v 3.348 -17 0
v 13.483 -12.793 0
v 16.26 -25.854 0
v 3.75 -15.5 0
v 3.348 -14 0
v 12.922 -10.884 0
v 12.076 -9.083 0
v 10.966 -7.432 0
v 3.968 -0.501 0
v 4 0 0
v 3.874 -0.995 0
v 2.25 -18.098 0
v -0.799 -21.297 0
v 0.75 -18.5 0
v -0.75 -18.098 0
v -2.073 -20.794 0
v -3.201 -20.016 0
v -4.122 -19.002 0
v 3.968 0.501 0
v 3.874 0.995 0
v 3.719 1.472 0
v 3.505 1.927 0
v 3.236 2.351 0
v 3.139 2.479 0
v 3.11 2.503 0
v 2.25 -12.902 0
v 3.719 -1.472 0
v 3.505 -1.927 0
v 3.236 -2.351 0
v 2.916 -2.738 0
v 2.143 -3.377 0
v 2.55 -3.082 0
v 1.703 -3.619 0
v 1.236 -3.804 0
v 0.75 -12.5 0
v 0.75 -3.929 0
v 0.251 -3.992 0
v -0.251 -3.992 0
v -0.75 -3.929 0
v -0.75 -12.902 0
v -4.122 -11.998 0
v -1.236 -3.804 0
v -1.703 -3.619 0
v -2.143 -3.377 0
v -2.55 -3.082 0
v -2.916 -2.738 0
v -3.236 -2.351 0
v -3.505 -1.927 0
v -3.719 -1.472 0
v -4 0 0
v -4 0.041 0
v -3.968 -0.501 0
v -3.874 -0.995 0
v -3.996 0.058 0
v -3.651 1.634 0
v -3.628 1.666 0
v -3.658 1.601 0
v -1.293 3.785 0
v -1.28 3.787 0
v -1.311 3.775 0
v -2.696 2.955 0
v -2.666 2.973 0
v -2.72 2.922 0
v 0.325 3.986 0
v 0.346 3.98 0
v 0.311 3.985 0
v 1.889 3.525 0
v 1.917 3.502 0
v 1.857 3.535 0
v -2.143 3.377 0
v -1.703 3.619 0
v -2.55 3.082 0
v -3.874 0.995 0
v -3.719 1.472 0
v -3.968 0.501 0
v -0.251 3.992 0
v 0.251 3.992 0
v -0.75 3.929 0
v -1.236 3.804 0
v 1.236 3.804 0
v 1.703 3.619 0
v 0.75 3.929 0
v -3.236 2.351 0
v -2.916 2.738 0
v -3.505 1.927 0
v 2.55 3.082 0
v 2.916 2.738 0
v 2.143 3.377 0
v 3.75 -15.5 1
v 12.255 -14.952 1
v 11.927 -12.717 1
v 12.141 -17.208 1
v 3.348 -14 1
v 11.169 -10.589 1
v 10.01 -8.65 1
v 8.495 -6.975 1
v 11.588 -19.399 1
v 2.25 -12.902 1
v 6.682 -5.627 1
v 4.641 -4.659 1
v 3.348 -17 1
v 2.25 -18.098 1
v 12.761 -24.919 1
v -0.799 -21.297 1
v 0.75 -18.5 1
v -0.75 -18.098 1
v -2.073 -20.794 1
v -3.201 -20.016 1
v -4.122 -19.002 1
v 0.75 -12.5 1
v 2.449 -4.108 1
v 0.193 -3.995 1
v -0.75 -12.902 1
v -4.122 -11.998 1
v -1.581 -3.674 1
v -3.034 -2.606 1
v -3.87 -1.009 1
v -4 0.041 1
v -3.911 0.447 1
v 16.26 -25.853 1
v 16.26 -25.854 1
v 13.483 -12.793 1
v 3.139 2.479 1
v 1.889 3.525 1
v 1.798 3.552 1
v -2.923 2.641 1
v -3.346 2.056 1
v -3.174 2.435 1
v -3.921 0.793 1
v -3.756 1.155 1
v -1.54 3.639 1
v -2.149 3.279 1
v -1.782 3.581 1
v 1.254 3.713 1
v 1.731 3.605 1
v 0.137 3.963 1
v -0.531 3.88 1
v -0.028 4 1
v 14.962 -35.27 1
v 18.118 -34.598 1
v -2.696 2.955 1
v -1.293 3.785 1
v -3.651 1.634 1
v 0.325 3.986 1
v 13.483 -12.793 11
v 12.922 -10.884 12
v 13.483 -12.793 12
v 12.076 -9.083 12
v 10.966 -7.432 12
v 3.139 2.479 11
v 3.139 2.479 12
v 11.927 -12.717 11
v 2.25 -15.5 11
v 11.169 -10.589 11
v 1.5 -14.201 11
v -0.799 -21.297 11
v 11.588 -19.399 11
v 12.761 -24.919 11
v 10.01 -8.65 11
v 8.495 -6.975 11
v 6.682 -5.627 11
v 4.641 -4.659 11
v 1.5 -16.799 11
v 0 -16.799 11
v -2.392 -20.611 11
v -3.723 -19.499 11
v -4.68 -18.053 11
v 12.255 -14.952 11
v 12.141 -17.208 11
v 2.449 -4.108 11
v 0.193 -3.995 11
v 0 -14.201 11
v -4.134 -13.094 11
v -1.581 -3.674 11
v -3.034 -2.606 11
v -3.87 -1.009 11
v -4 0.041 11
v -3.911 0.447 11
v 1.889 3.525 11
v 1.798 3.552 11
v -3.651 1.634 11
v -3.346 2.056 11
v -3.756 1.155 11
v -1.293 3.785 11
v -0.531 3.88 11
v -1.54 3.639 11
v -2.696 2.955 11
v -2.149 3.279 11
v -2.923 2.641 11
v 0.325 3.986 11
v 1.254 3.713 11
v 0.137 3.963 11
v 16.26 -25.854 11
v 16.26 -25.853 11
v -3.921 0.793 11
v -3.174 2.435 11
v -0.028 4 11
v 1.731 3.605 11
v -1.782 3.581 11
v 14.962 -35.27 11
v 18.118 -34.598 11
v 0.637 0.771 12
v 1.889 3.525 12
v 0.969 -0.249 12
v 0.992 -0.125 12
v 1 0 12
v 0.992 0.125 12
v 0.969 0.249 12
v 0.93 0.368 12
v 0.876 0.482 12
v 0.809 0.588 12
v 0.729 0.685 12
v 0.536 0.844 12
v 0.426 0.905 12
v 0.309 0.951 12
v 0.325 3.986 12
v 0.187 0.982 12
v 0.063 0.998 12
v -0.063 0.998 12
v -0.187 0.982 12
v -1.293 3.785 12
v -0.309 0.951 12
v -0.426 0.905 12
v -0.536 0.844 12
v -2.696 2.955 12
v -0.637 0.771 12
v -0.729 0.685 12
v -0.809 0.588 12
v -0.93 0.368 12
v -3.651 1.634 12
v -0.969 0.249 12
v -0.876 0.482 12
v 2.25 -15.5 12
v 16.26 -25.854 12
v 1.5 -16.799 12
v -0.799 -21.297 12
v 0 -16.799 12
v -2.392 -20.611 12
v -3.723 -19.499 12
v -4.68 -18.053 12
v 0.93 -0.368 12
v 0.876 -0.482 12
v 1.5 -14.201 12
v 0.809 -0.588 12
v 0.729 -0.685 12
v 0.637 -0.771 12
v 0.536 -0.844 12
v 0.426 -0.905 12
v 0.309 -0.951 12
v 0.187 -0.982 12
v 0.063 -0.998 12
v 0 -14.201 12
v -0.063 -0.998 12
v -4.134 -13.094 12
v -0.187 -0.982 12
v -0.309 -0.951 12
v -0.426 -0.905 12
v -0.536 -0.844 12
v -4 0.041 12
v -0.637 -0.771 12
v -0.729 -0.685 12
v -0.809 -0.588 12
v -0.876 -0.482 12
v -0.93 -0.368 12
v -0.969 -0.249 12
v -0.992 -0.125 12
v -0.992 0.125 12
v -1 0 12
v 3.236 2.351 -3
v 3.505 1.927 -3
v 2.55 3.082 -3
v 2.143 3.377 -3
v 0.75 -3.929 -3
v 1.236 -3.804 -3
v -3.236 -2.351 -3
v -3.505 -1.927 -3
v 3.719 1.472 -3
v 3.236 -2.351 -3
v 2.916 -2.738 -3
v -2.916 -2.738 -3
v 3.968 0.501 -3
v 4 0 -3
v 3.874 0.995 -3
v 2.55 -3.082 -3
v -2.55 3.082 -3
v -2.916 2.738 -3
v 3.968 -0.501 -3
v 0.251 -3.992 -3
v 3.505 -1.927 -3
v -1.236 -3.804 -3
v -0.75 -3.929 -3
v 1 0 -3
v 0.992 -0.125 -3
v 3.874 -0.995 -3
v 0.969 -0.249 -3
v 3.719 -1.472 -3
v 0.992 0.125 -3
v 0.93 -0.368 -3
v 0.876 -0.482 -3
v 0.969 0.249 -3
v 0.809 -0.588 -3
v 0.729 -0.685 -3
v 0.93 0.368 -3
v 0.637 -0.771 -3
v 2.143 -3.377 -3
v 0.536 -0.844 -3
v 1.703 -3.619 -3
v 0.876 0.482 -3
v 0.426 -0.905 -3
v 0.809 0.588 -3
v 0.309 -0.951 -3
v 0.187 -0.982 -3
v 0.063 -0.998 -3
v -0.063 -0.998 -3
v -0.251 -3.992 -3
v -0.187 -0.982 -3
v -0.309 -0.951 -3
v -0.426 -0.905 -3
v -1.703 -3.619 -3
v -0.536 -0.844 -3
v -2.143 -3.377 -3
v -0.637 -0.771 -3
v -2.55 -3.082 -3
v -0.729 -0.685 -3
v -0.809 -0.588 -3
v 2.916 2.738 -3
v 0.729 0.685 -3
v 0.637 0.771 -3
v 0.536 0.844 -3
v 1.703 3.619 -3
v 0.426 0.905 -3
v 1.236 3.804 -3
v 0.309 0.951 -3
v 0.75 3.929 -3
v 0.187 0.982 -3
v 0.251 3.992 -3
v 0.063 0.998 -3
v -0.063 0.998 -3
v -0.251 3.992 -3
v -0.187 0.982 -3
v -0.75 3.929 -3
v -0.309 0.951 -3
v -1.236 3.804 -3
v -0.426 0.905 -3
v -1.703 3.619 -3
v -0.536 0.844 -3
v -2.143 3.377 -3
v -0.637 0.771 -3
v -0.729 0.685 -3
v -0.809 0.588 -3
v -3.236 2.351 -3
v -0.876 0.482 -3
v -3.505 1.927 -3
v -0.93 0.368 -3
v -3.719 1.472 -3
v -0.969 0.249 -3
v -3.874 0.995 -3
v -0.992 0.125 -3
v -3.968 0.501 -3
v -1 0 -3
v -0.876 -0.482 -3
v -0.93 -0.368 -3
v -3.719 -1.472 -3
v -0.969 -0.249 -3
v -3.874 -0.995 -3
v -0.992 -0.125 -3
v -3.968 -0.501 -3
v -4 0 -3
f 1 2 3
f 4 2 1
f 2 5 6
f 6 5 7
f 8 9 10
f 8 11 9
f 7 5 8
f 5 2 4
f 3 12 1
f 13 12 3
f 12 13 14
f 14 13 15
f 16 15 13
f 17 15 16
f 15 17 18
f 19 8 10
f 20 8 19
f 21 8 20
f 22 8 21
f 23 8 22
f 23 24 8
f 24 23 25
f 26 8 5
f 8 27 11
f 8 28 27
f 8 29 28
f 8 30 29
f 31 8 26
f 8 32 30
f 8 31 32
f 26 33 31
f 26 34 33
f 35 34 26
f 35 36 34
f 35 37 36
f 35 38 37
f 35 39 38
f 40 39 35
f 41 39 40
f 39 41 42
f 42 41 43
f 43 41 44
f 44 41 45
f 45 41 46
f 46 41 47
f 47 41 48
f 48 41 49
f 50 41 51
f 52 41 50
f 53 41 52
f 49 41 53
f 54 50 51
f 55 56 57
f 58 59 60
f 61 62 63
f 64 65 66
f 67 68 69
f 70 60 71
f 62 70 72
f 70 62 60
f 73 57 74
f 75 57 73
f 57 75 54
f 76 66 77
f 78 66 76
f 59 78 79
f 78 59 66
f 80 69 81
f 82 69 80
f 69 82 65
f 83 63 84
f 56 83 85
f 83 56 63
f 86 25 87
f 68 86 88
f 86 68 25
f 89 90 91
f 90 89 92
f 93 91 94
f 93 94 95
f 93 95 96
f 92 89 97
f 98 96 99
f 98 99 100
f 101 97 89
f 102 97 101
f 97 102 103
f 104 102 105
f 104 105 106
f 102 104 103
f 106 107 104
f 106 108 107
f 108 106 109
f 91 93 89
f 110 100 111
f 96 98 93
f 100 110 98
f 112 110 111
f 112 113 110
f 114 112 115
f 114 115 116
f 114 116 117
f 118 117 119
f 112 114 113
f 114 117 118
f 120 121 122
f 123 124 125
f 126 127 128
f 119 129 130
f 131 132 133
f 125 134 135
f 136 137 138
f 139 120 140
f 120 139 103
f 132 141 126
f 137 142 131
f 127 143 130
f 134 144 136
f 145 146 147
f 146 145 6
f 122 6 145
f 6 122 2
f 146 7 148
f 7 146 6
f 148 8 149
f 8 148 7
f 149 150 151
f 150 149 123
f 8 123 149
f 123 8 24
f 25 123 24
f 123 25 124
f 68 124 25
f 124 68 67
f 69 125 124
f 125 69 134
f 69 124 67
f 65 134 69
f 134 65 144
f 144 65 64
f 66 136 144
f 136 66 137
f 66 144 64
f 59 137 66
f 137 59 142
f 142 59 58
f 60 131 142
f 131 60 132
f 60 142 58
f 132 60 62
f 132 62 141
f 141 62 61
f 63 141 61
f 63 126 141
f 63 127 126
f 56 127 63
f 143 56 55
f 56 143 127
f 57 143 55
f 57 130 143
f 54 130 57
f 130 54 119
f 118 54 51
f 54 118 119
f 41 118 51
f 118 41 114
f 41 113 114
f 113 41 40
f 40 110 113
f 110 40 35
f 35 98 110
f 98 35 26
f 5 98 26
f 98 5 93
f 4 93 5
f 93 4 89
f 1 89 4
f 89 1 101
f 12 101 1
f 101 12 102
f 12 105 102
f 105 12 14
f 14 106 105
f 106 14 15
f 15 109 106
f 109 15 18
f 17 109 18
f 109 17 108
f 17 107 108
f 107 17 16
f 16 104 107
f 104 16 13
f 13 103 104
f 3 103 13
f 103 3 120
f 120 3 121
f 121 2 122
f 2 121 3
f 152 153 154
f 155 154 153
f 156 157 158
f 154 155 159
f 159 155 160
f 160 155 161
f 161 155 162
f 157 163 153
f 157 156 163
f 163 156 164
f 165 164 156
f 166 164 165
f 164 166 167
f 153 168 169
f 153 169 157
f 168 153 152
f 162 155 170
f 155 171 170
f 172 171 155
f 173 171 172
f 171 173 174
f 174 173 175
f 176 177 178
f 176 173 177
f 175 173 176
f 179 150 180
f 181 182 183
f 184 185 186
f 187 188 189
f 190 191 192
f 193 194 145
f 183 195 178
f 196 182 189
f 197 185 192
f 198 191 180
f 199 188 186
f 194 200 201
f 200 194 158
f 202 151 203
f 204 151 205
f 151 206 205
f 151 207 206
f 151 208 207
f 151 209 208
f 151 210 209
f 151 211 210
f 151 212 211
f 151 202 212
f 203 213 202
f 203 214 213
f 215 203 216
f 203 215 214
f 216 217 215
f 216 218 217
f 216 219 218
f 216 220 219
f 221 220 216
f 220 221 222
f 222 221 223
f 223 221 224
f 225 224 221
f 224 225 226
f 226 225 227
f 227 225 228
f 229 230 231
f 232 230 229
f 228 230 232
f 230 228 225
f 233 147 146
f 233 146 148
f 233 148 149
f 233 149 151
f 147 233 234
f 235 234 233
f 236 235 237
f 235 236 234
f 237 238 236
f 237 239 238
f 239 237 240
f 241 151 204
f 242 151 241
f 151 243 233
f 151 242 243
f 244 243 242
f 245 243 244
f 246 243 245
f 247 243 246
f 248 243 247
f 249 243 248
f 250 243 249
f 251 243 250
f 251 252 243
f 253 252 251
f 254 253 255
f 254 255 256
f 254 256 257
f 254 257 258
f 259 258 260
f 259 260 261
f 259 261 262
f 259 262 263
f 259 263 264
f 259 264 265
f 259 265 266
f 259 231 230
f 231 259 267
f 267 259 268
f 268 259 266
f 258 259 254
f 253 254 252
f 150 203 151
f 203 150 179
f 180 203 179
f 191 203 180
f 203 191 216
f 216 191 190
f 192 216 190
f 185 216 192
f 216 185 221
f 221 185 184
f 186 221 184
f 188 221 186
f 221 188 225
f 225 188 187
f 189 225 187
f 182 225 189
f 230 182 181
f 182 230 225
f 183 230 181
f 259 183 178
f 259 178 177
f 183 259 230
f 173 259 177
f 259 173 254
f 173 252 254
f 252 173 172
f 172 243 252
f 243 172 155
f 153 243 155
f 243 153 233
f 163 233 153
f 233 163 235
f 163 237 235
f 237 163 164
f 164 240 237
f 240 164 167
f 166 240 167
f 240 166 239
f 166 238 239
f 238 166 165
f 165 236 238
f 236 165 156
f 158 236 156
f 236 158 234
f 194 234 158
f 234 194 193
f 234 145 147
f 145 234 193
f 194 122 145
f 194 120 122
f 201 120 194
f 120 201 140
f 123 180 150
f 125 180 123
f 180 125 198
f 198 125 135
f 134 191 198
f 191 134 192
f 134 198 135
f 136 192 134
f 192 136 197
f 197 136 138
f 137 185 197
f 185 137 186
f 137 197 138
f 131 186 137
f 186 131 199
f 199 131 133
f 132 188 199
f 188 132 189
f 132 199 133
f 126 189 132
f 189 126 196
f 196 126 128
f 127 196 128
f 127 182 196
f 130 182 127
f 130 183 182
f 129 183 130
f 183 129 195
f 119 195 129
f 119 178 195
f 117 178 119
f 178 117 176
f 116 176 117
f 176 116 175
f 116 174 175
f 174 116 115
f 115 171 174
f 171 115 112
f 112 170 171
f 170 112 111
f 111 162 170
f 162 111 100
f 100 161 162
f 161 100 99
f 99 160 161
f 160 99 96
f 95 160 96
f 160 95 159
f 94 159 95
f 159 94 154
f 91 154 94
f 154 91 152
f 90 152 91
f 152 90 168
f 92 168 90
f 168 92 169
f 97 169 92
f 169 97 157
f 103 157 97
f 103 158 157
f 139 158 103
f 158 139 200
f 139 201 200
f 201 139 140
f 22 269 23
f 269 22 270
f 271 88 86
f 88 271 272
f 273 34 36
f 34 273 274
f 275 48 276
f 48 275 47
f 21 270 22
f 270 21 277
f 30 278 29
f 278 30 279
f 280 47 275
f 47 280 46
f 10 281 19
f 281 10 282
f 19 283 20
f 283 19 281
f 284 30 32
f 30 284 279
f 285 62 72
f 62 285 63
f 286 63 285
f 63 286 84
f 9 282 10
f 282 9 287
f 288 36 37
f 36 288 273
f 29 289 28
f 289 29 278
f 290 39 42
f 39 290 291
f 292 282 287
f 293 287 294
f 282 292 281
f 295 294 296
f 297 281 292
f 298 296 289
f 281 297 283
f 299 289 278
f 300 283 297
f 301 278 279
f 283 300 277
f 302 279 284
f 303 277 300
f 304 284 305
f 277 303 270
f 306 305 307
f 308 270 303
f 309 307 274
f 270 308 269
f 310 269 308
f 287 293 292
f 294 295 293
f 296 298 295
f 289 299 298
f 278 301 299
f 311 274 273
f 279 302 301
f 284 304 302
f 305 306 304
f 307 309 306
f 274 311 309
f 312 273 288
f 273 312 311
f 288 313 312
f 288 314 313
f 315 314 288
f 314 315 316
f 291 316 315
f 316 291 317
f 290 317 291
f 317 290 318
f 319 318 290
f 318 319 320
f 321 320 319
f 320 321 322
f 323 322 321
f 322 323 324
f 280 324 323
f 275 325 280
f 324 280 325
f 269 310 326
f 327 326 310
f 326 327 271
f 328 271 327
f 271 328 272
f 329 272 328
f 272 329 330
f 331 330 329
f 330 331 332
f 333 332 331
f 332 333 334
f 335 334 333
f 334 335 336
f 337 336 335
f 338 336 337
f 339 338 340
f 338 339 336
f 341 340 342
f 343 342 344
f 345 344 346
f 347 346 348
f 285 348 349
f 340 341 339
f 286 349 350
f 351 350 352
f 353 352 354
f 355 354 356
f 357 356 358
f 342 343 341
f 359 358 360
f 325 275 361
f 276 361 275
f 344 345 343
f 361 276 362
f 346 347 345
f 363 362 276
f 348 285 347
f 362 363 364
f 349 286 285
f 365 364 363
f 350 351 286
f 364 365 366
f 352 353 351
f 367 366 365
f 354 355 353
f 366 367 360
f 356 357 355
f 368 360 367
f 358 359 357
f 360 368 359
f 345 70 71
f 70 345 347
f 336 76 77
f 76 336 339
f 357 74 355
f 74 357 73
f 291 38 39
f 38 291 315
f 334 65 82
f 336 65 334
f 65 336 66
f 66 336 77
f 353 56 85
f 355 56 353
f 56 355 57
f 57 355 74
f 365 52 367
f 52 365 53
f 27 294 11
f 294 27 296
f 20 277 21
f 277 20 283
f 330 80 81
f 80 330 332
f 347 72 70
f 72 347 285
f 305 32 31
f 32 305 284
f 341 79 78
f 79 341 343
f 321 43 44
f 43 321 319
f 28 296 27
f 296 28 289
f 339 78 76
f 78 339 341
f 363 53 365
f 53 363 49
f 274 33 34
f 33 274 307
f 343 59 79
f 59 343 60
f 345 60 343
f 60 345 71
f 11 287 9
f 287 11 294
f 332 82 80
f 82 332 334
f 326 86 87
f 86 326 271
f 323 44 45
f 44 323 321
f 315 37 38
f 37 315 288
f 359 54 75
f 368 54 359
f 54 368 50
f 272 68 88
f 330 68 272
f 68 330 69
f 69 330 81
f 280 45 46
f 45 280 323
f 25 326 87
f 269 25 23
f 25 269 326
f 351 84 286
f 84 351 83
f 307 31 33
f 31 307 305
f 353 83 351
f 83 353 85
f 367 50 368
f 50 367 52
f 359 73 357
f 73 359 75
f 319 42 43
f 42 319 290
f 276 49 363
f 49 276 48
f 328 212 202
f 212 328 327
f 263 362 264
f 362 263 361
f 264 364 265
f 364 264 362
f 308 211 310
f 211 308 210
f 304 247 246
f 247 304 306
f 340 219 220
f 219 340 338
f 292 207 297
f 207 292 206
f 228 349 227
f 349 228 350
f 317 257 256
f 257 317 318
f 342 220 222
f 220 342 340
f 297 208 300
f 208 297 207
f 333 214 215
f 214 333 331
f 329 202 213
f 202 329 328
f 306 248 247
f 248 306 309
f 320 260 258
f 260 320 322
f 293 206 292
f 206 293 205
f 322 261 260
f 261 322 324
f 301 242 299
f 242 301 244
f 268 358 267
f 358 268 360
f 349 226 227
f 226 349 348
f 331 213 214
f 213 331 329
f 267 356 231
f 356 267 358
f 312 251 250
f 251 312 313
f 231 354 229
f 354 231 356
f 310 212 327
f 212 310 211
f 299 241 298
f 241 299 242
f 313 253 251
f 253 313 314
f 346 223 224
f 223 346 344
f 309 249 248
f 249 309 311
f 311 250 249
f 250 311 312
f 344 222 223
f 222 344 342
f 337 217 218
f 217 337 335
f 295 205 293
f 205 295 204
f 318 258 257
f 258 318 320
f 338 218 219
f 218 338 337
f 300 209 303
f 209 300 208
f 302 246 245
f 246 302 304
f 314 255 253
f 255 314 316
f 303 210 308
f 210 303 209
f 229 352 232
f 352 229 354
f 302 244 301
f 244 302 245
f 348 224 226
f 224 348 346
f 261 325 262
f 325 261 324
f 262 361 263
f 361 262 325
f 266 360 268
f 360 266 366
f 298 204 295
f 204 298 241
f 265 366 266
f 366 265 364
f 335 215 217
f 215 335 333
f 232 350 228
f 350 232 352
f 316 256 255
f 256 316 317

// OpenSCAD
include </usr/share/openscad/libraries/MCAD/bearing.scad>

//bearing(pos=[-mot_pos-11-thread_diam/2,0,thread_elev-7/2]);

thickness = 2.5;	// epaisseur piece
chamfer = 0.8;

//  Printer variables
//
thread_diam = 3;	// material diameter
wheel_diam = 10;		// dragging diameter
thread_elev = 7.5;   // thread position from motor

//  Motor variables
//
motor_l = 42.3;	// H/L motor
axes = 31;			// entre-axes screw
motor_d = 22;		// epaulement diam
motor_dh = 2;		// epaulement H
motor_w = 35;		//	each motor as a different width
screw_diam = 3;	// screw diameter

mot_pos = thread_diam/2 + wheel_diam/2;


//bearing(pos=[axes/2-mot_pos-11+1.5,-axes/2,1]);
sup_gallet();

module sup_gallet(){

    sup_thick = 1;
    inside_height = 7+1;

    ep_h = 3;       // hauteur epaulement


    difference(){
        union(){
            linear_extrude(height = sup_thick)
                import("2d-sections/support_gallet_section2d-0.dxf");
            
            translate([0,0,inside_height+sup_thick*3]){
                linear_extrude(height = sup_thick)
                    import("2d-sections/support_gallet_section2d-2.dxf");
            }
        
        
            translate([0,0,sup_thick]){
                linear_extrude(height = sup_thick*2+inside_height)
                    import("2d-sections/support_gallet_section2d-1.dxf");
            }
            translate([0,0,-ep_h])
                cylinder(r = 4, h = ep_h, $fn=50 );
        }

        translate([0,0,-ep_h*2])
            cylinder(d = 2, h = 100, $fn=50 );
    }




}
